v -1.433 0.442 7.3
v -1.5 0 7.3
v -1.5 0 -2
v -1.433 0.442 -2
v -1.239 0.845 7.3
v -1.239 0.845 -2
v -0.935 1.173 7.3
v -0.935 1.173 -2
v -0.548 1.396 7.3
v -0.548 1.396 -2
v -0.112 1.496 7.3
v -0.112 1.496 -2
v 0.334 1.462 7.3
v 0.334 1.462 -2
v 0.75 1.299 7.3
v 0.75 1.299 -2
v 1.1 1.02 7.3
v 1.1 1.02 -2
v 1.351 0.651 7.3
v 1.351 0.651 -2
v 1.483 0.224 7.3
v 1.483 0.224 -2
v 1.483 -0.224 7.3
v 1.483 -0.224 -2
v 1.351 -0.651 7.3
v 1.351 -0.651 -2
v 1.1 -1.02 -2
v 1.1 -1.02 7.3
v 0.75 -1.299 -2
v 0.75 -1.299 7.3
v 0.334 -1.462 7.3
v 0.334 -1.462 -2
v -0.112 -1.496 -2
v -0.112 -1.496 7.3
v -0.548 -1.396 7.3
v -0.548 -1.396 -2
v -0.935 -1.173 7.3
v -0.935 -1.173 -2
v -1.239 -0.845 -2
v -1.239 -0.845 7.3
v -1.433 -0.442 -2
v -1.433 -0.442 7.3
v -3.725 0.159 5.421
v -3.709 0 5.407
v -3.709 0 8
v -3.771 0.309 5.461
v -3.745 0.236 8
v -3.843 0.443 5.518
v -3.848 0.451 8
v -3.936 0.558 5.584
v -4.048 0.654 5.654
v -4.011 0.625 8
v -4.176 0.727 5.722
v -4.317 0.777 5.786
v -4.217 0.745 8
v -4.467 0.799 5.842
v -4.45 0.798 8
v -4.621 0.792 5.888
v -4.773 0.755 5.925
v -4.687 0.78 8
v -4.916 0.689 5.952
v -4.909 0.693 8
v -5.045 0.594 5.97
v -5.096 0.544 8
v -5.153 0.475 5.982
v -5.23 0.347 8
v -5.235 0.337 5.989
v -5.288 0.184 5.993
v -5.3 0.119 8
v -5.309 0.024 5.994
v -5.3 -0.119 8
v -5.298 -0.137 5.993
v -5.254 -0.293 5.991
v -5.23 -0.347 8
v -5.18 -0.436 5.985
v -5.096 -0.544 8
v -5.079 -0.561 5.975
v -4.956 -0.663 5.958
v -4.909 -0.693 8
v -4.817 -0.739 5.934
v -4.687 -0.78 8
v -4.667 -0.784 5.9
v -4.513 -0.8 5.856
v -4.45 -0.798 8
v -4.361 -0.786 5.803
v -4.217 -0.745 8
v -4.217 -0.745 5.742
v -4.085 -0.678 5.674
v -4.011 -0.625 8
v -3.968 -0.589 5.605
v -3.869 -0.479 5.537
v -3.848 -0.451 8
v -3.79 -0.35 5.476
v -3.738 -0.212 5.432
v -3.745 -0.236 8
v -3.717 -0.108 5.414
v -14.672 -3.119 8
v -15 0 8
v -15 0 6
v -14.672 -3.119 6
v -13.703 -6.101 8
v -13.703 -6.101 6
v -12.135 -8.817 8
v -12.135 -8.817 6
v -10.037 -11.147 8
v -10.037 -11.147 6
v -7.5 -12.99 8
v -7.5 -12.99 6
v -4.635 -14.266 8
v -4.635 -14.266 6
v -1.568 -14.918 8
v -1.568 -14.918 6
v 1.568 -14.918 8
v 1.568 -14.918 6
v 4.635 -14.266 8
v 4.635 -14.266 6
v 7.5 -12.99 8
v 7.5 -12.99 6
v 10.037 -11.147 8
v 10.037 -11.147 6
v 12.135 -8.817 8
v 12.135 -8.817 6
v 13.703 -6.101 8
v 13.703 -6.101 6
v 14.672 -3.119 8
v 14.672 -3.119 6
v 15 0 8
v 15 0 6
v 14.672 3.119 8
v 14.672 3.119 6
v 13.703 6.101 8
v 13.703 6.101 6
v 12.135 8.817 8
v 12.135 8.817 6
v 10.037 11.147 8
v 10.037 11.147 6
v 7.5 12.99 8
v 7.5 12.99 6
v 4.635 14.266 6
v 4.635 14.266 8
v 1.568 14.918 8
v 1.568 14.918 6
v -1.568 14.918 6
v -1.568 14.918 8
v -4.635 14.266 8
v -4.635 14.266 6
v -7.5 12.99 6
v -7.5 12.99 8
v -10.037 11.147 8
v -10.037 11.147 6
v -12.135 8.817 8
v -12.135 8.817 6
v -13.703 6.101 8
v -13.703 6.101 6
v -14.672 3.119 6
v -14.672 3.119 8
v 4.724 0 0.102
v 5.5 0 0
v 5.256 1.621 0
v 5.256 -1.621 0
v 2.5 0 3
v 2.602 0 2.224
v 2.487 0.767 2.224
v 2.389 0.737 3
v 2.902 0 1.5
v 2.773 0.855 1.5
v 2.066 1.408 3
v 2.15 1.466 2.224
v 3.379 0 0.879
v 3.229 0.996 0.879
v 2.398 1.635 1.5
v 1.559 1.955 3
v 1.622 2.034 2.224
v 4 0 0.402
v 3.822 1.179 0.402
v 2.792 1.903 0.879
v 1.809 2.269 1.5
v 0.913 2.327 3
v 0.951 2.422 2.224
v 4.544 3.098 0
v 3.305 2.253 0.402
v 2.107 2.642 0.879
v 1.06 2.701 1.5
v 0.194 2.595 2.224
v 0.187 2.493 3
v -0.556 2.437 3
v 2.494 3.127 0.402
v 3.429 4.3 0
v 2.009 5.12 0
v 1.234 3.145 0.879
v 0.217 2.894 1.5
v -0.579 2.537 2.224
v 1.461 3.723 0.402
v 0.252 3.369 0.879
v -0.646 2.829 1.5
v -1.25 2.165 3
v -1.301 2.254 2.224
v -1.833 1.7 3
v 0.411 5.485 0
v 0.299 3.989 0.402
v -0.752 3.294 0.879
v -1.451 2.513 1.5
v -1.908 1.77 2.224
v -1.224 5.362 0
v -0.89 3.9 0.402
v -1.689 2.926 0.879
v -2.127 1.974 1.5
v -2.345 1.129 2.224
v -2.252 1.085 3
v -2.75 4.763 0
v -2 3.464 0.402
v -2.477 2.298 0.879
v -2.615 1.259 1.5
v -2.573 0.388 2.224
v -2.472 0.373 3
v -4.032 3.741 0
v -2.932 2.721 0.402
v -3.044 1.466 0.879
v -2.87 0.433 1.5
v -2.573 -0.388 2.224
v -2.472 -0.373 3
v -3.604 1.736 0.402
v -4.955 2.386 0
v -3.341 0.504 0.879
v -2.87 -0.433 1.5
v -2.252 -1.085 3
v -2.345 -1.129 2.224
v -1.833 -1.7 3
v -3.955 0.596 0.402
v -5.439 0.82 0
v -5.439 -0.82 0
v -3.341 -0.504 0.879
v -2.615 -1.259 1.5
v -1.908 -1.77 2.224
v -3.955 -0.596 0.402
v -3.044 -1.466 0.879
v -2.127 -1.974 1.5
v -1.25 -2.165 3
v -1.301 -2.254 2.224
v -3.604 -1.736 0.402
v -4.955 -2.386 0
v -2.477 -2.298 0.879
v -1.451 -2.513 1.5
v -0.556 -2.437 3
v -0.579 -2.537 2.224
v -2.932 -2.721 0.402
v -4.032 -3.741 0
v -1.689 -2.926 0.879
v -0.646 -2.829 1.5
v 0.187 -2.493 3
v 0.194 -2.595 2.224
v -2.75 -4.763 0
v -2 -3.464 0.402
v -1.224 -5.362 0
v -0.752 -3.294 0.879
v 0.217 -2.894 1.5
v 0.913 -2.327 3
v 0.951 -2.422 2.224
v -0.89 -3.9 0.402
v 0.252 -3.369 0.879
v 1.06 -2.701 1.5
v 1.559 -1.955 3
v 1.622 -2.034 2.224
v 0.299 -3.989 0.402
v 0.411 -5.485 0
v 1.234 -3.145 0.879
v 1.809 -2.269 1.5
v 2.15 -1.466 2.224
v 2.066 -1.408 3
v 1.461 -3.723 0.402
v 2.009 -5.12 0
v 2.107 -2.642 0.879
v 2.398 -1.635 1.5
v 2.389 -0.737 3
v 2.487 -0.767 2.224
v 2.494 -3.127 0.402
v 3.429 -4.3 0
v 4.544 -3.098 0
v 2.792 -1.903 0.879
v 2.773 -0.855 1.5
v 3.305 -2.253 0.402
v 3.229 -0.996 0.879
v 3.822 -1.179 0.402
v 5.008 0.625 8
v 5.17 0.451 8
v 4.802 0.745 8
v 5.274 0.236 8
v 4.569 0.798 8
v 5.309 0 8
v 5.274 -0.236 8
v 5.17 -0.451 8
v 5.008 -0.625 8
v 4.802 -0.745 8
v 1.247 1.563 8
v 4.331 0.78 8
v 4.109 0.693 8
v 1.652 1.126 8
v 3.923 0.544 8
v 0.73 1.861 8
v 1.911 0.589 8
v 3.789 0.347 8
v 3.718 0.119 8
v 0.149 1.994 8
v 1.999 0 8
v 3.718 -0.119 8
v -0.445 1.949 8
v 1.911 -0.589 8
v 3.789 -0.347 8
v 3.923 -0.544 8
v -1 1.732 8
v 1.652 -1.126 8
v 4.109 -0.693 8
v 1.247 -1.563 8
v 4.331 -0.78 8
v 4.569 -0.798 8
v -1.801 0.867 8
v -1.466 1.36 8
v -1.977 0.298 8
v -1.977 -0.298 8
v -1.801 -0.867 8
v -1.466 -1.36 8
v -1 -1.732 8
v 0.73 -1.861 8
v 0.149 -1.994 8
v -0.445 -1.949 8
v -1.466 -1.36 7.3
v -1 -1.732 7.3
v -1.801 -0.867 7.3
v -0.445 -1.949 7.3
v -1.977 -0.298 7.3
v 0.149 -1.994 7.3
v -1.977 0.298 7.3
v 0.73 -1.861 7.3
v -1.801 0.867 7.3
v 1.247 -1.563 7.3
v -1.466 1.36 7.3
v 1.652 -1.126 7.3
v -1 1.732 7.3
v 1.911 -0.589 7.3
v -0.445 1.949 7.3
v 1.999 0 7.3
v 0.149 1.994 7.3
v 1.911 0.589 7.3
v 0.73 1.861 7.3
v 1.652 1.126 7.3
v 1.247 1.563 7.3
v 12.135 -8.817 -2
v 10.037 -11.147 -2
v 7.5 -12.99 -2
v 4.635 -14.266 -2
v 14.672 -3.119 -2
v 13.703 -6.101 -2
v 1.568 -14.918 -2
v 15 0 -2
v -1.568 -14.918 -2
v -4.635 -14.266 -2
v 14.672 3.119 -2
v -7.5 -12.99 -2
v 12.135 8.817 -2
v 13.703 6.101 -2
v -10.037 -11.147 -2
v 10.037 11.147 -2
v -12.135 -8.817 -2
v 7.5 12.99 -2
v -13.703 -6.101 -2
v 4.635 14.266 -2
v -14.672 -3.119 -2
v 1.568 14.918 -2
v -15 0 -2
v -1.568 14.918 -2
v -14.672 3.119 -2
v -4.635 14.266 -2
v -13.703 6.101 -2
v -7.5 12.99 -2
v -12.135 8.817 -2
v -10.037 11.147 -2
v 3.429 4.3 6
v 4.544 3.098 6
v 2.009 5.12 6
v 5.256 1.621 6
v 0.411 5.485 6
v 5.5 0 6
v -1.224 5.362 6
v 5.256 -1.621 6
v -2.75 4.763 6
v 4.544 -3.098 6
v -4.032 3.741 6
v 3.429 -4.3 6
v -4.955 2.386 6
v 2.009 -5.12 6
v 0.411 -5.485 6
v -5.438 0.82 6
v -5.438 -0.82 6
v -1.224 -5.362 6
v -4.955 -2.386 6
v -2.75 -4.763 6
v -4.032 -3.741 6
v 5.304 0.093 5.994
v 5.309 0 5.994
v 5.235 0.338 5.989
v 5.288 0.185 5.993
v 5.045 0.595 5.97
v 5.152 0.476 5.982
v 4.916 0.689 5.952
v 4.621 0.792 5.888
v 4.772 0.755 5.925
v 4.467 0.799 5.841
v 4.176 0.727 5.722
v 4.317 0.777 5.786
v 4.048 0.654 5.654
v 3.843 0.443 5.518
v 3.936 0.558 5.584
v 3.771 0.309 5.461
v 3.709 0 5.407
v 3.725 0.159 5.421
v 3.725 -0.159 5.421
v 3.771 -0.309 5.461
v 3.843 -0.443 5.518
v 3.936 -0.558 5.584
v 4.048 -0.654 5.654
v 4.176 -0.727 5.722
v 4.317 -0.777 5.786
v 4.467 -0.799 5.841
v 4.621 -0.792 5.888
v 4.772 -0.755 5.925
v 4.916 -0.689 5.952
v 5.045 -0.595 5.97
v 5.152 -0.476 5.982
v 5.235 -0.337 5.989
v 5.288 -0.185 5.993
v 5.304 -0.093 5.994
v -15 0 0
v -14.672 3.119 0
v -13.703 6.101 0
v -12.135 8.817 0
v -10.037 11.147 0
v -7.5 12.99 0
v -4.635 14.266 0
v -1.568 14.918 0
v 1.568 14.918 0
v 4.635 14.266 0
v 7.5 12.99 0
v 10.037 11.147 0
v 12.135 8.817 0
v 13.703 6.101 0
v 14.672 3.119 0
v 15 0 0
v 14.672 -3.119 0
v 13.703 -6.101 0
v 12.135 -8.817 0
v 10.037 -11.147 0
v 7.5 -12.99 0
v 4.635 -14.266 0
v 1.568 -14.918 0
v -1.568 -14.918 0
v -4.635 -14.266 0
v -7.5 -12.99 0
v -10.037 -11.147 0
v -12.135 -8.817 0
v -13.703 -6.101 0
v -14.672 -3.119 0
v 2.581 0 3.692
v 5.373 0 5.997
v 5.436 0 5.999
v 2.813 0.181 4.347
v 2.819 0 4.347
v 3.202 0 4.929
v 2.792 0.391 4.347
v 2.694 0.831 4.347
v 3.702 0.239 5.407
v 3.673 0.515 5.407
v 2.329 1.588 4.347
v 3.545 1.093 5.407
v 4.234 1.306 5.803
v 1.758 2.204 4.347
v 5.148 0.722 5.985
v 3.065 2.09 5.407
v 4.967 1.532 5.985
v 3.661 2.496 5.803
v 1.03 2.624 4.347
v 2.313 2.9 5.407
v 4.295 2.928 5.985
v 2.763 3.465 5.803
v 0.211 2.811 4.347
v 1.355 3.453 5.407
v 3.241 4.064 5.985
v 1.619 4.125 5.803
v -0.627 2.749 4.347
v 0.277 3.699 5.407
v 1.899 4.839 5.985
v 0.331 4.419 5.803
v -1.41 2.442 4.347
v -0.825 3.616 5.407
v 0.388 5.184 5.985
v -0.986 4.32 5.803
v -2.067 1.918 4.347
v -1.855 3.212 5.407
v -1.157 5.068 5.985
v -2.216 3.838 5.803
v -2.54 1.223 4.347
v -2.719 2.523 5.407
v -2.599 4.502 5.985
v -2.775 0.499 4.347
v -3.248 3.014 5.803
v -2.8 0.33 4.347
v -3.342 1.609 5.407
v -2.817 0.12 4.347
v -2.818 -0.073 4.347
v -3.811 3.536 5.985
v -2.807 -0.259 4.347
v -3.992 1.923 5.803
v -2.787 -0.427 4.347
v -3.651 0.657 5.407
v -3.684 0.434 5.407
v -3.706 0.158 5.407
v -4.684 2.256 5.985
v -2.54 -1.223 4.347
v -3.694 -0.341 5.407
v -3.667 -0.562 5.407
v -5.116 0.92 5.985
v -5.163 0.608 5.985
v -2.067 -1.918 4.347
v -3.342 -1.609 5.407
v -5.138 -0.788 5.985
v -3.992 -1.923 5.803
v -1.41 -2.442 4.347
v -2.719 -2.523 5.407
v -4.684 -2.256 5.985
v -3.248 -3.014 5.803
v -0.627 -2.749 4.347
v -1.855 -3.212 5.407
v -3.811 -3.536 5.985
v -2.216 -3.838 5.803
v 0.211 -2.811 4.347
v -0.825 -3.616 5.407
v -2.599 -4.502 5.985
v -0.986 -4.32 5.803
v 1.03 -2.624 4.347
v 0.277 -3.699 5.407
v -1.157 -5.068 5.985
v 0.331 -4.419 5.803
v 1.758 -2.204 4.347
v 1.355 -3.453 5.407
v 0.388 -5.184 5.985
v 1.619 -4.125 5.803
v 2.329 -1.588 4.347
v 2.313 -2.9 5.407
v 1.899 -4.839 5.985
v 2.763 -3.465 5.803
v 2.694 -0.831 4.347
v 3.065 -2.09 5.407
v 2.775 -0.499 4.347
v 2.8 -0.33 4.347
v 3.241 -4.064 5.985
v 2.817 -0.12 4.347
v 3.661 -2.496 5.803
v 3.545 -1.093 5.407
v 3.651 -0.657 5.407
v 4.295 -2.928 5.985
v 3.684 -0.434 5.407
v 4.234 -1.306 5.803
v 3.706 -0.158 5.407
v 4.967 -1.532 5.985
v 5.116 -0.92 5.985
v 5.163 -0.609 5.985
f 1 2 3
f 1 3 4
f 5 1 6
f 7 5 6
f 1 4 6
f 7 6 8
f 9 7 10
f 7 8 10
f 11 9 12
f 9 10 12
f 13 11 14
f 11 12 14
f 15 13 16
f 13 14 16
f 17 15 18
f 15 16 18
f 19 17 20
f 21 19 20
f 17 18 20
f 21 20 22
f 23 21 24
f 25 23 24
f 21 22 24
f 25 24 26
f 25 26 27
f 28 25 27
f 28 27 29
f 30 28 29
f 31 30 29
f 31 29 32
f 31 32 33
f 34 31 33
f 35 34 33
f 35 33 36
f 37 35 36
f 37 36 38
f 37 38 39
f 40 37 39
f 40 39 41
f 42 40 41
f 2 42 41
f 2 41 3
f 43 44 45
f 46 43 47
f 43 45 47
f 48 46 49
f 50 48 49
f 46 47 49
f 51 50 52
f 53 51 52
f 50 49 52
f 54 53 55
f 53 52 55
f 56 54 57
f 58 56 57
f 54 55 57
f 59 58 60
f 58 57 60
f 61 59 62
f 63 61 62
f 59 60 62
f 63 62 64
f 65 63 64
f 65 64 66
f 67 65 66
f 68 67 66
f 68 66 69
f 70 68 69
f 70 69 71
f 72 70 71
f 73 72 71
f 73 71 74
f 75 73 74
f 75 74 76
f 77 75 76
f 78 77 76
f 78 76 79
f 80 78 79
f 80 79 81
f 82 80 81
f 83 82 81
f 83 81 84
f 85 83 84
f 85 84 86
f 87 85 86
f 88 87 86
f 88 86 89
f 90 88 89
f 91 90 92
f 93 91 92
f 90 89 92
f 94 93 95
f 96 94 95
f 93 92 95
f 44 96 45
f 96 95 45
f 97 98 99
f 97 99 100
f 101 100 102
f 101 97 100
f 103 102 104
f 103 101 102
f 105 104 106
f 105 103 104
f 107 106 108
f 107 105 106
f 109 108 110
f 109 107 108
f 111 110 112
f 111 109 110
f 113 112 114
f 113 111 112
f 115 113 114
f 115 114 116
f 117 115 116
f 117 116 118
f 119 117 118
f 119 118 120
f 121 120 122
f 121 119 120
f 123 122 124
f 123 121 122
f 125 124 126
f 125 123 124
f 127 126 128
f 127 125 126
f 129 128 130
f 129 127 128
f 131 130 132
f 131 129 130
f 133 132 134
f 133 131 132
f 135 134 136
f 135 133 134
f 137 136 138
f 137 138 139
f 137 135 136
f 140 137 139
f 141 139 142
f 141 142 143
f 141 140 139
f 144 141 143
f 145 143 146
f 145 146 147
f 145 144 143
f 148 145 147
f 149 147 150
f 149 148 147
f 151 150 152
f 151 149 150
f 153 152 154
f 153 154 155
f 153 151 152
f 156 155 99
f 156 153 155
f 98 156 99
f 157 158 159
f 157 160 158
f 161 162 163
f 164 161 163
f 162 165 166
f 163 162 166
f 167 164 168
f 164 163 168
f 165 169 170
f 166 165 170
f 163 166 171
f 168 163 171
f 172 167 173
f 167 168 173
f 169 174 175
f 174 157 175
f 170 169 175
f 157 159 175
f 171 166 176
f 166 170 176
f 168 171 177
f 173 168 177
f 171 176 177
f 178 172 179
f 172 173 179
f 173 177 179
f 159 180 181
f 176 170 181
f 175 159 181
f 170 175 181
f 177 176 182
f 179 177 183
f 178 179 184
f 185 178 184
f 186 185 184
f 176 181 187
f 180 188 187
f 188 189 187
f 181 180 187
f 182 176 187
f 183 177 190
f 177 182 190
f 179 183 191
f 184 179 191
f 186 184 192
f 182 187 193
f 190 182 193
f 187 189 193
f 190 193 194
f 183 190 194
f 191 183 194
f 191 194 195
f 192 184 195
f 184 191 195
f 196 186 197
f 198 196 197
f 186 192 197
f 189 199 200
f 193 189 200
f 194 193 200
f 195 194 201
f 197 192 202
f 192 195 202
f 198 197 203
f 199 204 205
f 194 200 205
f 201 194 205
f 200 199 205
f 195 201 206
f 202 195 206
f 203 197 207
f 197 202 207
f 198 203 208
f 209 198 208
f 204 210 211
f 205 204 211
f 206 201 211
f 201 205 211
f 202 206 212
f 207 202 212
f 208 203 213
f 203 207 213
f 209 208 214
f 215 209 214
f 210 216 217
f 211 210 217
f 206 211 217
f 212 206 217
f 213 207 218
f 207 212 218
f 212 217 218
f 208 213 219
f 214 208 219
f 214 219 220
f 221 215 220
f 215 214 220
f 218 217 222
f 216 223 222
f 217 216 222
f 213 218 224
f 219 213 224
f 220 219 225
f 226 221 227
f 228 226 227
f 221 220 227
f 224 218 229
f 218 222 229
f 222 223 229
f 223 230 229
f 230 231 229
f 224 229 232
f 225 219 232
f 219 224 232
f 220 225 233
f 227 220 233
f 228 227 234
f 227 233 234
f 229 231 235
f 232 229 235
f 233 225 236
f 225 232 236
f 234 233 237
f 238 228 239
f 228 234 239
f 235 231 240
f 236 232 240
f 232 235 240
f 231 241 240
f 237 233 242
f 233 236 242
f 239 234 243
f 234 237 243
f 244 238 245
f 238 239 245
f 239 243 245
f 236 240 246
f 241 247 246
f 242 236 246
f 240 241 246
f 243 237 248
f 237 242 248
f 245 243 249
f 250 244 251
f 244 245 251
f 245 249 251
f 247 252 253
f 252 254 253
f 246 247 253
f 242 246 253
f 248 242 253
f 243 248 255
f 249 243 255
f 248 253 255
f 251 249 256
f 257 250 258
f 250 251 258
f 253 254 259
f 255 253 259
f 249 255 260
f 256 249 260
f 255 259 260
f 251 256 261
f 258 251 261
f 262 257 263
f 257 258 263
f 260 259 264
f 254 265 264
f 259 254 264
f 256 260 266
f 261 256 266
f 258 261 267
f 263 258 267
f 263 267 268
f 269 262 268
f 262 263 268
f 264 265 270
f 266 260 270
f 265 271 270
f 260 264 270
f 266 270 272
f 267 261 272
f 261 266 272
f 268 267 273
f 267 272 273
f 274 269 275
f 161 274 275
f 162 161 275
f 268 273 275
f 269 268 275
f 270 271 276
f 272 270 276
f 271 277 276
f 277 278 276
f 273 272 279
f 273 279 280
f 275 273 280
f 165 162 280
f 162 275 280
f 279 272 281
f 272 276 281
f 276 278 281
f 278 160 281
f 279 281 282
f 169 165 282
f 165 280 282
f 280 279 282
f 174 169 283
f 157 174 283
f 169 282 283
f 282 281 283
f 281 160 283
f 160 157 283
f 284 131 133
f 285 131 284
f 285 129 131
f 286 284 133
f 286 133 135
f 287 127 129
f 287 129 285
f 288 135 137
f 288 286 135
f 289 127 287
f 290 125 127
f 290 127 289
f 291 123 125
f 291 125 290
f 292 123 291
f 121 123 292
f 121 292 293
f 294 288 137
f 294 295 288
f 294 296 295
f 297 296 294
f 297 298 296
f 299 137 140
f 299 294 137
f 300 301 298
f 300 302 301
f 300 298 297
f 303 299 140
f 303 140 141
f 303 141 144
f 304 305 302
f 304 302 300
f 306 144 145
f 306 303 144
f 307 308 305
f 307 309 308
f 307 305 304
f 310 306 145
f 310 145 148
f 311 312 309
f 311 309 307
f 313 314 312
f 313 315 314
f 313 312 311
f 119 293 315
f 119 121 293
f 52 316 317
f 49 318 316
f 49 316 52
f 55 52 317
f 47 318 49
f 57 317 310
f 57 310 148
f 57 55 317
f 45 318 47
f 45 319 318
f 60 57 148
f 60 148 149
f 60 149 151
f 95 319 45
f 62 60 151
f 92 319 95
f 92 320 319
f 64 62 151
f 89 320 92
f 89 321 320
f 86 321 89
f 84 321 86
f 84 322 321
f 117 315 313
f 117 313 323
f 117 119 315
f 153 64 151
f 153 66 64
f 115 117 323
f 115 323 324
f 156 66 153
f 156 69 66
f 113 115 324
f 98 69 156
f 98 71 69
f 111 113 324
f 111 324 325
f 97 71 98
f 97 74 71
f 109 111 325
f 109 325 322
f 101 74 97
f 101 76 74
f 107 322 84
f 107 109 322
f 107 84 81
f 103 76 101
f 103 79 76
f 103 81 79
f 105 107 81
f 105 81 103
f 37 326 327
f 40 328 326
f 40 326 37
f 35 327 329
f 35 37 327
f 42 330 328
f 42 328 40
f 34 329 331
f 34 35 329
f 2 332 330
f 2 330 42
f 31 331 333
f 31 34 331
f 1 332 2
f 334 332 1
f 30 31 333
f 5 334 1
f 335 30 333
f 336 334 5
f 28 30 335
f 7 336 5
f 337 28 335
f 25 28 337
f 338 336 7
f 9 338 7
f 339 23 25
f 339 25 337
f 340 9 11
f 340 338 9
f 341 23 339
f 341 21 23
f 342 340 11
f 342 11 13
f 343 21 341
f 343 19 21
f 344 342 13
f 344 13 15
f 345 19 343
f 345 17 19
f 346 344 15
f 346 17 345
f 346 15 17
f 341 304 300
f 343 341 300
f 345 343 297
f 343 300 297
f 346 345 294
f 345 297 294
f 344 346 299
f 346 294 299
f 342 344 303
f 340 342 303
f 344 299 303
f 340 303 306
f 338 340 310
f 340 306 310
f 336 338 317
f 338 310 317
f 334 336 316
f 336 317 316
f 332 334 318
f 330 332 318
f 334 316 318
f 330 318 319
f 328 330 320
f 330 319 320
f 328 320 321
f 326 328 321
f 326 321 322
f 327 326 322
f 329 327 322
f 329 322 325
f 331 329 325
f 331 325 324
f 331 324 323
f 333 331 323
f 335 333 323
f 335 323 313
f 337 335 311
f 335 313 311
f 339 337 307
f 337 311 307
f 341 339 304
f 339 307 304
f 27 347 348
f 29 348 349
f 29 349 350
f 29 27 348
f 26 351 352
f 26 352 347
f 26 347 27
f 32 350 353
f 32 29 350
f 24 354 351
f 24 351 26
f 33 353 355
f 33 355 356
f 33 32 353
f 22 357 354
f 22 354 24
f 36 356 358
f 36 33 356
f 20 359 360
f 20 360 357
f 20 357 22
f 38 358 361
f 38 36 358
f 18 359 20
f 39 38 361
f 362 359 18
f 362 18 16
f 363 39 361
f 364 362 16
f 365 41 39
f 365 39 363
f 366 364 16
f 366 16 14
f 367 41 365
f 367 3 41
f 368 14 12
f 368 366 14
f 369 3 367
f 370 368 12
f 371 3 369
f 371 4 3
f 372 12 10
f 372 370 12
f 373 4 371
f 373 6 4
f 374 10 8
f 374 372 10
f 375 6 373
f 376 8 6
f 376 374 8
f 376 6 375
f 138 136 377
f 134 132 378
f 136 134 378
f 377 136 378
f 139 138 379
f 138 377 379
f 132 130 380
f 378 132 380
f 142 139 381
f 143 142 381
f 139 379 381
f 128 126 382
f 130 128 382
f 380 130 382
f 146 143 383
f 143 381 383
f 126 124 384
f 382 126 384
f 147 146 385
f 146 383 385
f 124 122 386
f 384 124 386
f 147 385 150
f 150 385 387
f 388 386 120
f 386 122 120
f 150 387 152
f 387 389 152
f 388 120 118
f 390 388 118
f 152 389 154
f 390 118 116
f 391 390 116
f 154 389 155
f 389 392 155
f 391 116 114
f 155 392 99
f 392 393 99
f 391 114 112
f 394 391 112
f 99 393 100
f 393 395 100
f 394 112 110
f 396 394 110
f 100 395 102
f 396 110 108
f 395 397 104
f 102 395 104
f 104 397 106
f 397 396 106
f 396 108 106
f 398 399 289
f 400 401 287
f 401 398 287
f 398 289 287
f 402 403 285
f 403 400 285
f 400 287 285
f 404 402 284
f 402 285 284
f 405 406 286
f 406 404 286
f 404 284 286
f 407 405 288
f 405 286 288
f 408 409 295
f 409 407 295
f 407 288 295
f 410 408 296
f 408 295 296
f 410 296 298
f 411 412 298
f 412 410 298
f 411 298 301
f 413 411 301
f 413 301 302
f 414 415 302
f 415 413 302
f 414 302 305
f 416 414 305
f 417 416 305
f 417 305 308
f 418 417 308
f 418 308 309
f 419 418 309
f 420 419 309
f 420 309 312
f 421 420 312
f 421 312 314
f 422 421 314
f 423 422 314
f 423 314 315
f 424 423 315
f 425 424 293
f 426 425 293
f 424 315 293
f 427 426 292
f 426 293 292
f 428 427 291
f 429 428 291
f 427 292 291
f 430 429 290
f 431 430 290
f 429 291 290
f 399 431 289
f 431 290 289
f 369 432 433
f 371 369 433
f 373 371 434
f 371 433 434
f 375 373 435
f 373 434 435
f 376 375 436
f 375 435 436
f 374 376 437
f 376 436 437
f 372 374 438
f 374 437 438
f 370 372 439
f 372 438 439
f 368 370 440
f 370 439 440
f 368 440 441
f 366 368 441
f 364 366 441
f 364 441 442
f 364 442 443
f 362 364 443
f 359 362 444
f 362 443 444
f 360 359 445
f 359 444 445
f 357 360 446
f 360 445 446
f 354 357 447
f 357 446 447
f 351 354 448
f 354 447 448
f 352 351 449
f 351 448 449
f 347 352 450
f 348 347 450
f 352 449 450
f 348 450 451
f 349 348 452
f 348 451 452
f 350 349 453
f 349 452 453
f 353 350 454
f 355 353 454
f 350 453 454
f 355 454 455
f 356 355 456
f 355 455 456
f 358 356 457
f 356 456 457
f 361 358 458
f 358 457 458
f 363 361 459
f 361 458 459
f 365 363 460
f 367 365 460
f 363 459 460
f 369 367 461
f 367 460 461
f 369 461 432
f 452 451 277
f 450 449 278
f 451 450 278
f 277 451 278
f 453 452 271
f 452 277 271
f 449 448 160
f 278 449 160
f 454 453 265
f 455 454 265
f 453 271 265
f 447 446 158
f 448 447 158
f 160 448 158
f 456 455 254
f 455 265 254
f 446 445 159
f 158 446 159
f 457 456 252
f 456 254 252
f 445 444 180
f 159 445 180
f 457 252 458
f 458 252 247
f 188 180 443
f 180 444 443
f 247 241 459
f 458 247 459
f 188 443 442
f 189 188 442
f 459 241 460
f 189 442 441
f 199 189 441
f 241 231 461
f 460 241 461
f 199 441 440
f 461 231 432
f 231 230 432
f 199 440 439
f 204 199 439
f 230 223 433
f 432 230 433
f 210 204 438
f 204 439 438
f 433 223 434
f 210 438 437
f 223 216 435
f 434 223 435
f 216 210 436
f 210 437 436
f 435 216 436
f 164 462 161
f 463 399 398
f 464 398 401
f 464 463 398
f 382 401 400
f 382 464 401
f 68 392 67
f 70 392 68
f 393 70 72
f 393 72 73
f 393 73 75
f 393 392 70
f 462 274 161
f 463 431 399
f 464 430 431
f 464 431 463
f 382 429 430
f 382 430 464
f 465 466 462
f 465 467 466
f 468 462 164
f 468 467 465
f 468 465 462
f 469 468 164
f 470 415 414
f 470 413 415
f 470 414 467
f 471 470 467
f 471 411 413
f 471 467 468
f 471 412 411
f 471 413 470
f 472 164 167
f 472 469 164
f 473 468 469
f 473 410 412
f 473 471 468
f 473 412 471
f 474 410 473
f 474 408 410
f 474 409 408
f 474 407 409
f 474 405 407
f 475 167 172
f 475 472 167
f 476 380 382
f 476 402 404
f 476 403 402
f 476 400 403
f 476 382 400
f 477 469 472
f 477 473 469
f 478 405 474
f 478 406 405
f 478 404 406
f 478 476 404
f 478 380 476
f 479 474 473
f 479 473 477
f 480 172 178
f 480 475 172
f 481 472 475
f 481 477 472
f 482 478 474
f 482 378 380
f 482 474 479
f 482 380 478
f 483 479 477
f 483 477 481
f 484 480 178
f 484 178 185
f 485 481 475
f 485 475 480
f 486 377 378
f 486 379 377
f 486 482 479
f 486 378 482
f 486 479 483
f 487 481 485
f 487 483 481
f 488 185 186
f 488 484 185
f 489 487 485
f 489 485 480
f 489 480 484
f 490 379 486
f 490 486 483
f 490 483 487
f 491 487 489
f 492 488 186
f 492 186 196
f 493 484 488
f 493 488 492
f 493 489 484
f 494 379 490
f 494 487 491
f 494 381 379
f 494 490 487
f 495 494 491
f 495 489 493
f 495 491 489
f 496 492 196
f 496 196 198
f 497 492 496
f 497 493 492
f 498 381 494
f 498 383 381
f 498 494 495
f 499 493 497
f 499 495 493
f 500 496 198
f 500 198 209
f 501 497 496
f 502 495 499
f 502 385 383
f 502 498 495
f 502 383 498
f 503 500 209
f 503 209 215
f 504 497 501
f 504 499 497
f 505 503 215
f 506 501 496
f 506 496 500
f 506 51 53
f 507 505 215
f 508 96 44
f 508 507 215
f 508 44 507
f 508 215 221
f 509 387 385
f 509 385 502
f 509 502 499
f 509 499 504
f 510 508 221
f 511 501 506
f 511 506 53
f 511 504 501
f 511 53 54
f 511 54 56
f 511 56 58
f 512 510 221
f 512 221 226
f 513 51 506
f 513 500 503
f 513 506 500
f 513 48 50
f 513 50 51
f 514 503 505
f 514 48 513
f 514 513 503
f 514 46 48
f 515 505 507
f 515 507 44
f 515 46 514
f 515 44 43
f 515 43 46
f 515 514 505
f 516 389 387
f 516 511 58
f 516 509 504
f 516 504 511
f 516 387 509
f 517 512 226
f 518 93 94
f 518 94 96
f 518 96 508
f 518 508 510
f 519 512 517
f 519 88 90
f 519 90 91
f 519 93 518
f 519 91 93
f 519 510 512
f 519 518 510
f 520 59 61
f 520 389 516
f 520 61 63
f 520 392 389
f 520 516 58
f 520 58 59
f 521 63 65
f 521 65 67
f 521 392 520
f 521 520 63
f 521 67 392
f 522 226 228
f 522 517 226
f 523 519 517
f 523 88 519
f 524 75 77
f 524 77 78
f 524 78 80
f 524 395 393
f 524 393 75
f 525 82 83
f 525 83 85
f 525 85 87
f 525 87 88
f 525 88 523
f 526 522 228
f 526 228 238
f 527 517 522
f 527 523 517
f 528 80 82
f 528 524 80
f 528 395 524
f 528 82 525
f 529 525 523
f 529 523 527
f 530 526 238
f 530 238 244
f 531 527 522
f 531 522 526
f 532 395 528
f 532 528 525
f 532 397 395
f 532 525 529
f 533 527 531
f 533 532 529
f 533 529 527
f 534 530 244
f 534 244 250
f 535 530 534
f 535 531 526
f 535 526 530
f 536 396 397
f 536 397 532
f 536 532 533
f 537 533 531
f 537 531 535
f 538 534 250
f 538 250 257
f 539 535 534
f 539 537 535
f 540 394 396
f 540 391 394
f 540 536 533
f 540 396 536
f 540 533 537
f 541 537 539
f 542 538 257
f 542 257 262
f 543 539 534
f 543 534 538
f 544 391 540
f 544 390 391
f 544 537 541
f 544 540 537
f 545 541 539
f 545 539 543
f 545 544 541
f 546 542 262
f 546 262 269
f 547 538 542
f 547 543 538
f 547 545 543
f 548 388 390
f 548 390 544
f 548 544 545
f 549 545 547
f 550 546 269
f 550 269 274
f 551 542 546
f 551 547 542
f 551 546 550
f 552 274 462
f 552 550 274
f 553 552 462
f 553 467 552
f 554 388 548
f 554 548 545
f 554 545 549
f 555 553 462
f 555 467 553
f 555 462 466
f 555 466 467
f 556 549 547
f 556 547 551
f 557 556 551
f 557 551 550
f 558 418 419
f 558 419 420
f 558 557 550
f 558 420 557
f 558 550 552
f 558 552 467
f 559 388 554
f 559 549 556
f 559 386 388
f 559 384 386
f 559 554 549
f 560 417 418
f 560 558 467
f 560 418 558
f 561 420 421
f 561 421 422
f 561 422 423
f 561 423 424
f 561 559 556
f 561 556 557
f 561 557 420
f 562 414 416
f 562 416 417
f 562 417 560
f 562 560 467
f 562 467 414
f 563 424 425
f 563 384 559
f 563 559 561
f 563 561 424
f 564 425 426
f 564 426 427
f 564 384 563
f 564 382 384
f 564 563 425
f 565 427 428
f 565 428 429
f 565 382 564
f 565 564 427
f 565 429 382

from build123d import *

# Parameters (mm, degrees)
SKETCH1_R           = 2.5
BOSS_EXTRUDE1_DEPTH = 6
SKETCH2_R           = 15
BOSS_EXTRUDE2_DEPTH = 2
BOSS_EXTRUDE3_START = 2
SKETCH3_R           = 15
BOSS_EXTRUDE3_DEPTH = 2
FILLET9_R           = 3
FILLET10_R          = 3
SKETCH4_R           = 1.5
CUT_EXTRUDE1_DEPTH  = 10
SKETCH5_R           = 1.999371682
CUT_EXTRUDE2_DEPTH  = 0.7
SKETCH7_R           = 0.8
CUT_EXTRUDE6_DEPTH  = 3


with BuildPart() as part:
    # Sketch1 → Boss-Extrude1 (new body)
    with BuildSketch(Plane.XY):
        Circle(SKETCH1_R)
    extrude(amount=BOSS_EXTRUDE1_DEPTH)

    # Sketch2 → Boss-Extrude2 (add)
    with BuildSketch(Plane(origin=(0, 0, 0), x_dir=(-1, 0, 0), z_dir=(0, 0, -1))):
        Circle(SKETCH2_R)
    extrude(amount=BOSS_EXTRUDE2_DEPTH)

    # Sketch3 → Boss-Extrude3 (add)
    with BuildSketch(Plane.XY.offset(6).offset(BOSS_EXTRUDE3_START)):
        with Locations(Location((0, 0, 0), (0, 0, 180))):
            Circle(SKETCH3_R)
    extrude(amount=-BOSS_EXTRUDE3_DEPTH)

    # Fillet9
    fillet9_edges = [part.edges().sort_by_distance(p)[0] for p in [
        (-2.5, 0, 0),
    ]]
    fillet(fillet9_edges, radius=FILLET9_R)

    # Fillet10
    fillet10_edges = [part.edges().sort_by_distance(p)[0] for p in [
        (-2.5, 0, 6),
    ]]
    fillet(fillet10_edges, radius=FILLET10_R - 0.0001)  # a hair under: the kernel refuses the full size

    # Sketch4 → Cut-Extrude1 (cut)
    with BuildSketch(Plane(origin=(0, 0, -2), x_dir=(-1, 0, 0), z_dir=(0, 0, -1))):
        Circle(SKETCH4_R)
    extrude(amount=-CUT_EXTRUDE1_DEPTH, mode=Mode.SUBTRACT)

    # Sketch5 → Cut-Extrude2 (cut)
    with BuildSketch(Plane.XY.offset(8)):
        Circle(SKETCH5_R)
    extrude(amount=-CUT_EXTRUDE2_DEPTH, mode=Mode.SUBTRACT)

    # Sketch7 → Cut-Extrude6 (cut)
    with BuildSketch(Plane.XY.offset(8)):
        with Locations((4.509371682, 0)):
            Circle(SKETCH7_R)
        with Locations((-4.509371682, 0)):
            Circle(SKETCH7_R)
    extrude(amount=-CUT_EXTRUDE6_DEPTH, mode=Mode.SUBTRACT)


solid = part.part
